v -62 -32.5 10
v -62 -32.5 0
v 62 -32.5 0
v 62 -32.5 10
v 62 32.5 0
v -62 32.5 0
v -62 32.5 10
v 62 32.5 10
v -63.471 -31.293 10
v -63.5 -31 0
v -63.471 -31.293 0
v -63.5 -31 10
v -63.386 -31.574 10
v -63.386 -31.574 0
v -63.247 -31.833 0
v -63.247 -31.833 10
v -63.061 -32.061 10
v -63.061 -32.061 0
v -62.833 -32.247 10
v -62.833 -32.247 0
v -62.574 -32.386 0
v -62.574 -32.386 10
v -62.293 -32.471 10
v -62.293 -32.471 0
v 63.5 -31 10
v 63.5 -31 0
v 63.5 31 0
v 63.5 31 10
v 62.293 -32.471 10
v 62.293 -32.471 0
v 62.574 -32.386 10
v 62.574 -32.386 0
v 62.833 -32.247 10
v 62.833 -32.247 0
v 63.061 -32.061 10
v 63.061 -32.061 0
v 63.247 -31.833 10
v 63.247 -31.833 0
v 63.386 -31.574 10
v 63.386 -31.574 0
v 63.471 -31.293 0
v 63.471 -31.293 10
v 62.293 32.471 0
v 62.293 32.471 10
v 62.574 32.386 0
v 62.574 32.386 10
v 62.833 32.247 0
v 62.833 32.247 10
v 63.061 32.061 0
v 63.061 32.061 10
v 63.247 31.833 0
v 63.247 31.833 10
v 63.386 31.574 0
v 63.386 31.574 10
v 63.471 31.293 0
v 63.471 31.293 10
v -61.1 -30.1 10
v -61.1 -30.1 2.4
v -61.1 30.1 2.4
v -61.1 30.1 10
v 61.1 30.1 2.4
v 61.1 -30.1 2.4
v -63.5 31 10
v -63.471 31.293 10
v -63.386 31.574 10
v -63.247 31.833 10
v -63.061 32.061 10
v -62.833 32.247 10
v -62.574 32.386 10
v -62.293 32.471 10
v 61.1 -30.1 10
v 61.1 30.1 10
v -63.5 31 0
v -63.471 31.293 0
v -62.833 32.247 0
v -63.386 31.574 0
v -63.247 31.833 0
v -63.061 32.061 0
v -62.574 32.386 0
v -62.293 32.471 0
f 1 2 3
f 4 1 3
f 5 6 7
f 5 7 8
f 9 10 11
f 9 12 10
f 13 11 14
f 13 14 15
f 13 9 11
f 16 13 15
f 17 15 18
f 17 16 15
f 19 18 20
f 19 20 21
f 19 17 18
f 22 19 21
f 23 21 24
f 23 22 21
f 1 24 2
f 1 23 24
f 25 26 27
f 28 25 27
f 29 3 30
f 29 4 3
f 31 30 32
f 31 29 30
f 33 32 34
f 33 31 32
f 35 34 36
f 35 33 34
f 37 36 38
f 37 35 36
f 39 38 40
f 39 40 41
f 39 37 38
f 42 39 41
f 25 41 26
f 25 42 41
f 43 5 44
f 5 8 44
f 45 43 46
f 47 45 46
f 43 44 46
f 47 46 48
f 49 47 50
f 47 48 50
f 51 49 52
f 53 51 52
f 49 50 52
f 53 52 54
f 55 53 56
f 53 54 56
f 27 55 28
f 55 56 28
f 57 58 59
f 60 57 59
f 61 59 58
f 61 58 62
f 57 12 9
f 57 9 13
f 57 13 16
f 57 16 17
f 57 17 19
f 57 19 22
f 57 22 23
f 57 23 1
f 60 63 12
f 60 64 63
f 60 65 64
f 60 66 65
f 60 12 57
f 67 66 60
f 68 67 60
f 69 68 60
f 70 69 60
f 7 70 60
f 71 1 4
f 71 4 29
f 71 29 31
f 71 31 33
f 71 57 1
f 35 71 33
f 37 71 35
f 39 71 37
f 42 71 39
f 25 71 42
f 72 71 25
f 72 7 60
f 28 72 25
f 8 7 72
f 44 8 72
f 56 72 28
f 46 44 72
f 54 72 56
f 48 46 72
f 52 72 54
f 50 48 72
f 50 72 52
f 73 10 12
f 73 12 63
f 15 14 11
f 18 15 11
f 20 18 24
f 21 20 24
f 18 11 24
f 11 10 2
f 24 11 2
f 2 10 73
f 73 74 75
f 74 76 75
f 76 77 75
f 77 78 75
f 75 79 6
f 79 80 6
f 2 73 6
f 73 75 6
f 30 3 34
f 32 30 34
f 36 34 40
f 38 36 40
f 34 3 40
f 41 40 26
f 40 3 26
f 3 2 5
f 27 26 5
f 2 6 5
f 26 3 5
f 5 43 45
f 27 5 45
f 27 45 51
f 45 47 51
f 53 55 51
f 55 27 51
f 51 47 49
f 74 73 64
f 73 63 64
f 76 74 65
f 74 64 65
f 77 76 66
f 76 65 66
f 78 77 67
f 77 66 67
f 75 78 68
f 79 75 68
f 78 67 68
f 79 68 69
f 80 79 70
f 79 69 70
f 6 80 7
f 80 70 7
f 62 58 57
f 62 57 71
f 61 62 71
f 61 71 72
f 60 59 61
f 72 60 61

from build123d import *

# Parameters (mm, degrees)
F1_W     = 127
F1_H     = 65
F1_W_2   = 122.2
F1_H_2   = 60.2
F2_DEPTH = 10
F3_DEPTH = 2.4
F4_R     = 1.5


with BuildPart() as f2:
    # F1 (on Top) → F2 (new body)
    with BuildSketch(Plane.XY):
        Rectangle(F1_W, F1_H)
        Rectangle(F1_W_2, F1_H_2, mode=Mode.SUBTRACT)
    extrude(amount=F2_DEPTH)

    # F1 (on Top) → F3 (join)
    with BuildSketch(Plane.XY):
        Rectangle(F1_W_2, F1_H_2)
    extrude(amount=F3_DEPTH)

    # F4
    f4_edges = [f2.edges().sort_by_distance(p)[0] for p in [
        (63.5, -32.5, 5),
        (63.5, 32.5, 5),
        (-63.5, 32.5, 5),
        (-63.5, -32.5, 5),
    ]]
    fillet(f4_edges, radius=F4_R)


solid = f2.part
